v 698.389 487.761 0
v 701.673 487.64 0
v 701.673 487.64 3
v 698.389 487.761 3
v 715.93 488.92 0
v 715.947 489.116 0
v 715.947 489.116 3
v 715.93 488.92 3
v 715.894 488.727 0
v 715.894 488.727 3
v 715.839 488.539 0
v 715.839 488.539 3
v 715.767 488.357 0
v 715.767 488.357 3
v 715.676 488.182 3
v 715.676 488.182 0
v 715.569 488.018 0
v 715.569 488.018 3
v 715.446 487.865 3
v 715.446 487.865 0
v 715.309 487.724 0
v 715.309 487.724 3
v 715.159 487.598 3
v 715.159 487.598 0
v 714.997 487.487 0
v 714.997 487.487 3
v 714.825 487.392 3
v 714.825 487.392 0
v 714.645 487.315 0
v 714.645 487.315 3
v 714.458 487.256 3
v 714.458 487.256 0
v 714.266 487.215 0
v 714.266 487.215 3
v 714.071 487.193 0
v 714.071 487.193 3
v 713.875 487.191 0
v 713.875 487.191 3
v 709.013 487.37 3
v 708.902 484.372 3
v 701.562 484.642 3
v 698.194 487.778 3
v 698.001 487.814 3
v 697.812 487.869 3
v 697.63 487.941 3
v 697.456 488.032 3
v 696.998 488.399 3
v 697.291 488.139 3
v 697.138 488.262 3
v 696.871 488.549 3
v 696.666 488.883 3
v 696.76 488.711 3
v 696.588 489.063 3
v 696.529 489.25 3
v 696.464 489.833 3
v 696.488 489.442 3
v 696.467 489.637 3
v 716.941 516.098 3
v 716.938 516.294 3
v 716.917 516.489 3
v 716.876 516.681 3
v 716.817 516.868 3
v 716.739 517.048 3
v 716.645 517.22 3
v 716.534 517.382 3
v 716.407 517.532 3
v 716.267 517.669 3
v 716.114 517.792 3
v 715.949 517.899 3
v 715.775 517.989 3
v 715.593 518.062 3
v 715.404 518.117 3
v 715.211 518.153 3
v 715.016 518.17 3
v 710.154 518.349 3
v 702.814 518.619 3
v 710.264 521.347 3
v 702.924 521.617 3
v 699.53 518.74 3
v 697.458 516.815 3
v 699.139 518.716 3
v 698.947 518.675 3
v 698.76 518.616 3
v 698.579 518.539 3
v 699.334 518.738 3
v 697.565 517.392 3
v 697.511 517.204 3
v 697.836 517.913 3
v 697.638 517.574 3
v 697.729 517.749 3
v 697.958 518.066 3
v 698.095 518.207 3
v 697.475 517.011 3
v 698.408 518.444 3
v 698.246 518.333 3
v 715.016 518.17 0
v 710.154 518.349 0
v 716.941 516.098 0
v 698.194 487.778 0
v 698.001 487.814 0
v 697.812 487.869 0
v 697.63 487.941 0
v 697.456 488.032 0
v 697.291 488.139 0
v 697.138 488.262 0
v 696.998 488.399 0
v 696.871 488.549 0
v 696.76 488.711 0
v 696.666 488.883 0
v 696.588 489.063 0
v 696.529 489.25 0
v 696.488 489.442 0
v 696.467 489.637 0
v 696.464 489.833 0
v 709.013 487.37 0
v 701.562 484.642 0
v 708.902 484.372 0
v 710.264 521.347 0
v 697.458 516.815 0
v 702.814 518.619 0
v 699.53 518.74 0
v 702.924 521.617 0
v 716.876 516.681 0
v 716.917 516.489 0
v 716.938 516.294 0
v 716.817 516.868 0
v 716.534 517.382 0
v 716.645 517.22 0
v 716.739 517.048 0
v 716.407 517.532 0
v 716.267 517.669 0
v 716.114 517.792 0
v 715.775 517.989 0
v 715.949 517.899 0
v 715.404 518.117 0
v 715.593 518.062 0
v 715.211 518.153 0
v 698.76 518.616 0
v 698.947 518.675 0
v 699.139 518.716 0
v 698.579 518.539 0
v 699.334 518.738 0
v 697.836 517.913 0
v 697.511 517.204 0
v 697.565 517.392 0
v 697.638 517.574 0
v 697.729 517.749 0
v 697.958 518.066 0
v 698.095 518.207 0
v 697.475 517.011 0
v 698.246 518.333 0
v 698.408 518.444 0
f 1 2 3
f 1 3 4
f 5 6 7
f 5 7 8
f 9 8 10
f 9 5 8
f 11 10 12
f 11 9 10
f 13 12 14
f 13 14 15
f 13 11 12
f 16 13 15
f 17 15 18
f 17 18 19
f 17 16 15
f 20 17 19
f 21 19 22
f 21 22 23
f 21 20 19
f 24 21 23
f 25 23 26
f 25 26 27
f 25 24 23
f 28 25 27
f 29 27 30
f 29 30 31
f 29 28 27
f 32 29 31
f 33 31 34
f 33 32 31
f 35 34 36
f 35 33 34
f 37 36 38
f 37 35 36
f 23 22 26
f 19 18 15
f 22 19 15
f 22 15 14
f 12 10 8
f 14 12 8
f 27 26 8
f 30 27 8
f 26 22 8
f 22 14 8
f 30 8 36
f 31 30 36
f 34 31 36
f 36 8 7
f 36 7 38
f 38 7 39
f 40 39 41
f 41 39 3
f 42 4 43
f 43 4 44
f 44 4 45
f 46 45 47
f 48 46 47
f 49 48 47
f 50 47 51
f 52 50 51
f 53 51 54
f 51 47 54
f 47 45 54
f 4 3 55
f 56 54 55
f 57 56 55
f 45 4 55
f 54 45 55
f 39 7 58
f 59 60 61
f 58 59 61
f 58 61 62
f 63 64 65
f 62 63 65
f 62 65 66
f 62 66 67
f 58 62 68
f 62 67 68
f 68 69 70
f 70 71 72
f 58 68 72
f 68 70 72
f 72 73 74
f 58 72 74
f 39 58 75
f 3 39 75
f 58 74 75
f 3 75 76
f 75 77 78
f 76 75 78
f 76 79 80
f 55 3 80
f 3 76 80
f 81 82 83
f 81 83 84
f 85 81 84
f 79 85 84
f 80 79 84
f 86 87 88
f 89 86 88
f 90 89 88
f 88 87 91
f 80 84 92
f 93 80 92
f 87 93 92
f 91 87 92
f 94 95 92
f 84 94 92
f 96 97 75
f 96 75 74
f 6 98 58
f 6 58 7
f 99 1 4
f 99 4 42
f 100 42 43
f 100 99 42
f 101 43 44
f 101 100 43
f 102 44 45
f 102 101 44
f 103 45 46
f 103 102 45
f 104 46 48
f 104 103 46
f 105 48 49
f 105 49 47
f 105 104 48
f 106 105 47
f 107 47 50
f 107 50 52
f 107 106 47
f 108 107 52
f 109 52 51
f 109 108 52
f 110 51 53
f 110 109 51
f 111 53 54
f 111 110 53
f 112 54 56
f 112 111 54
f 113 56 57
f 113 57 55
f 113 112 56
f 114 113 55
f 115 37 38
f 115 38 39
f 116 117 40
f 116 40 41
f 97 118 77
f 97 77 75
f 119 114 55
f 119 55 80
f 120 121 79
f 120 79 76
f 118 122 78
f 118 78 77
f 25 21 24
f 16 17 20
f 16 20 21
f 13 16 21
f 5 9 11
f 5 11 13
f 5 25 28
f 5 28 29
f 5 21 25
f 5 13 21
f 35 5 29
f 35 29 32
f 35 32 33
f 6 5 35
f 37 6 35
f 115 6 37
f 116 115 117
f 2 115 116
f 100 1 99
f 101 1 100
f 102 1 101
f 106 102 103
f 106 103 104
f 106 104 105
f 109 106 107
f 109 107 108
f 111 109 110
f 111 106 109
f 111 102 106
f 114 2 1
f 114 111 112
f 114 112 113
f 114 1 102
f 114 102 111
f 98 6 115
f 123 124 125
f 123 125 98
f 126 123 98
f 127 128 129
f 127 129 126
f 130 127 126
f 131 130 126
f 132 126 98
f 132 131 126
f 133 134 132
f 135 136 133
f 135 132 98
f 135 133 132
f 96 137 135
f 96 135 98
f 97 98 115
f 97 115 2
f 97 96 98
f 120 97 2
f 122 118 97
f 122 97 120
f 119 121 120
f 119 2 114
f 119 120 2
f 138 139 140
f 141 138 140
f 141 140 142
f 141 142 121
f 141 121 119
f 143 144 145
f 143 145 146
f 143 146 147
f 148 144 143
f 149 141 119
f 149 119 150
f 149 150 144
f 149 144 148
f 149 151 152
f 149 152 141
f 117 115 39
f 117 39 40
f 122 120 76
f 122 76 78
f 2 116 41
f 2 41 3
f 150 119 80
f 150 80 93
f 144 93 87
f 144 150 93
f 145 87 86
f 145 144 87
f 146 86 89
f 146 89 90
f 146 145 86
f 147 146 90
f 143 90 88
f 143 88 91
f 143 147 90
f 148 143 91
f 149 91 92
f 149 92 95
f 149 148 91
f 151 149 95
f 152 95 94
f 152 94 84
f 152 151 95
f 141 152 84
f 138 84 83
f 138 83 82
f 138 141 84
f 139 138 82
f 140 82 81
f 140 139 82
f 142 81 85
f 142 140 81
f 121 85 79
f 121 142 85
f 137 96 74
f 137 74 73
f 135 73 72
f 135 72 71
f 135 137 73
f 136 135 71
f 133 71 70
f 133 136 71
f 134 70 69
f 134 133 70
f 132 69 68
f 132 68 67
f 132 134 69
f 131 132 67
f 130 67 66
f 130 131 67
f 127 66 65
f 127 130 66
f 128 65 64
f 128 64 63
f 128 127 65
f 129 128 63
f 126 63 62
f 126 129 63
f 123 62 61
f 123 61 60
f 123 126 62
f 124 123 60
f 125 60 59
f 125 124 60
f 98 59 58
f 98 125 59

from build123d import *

# Parameters (mm, degrees)
BASE_EXTRUDE_DEPTH = 3


with BuildPart() as part:
    # Sketch1 → Base-Extrude (new body)
    with BuildSketch(Plane.XY):
        with BuildLine():
            Line((701.562436995, 484.642265501), (701.672859679, 487.640232618))
            Line((701.672859679, 487.640232618), (698.38928136, 487.761175083))
            ThreePointArc((698.38928136, 487.761175083), (696.997587478, 488.398618328), (696.464251738, 489.83343495))
            Line((696.464251738, 489.83343495), (697.458055899, 516.815138997))
            ThreePointArc((697.458055899, 516.815138997), (698.095499144, 518.206832879), (699.530315766, 518.740168618))
            Line((699.530315766, 518.740168618), (702.813894085, 518.619226153))
            Line((702.813894085, 518.619226153), (702.92431677, 521.61719327))
            Line((702.92431677, 521.61719327), (710.26431677, 521.346842571))
            Line((710.26431677, 521.346842571), (710.153894085, 518.348875455))
            Line((710.153894085, 518.348875455), (715.015630112, 518.169805464))
            ThreePointArc((715.015630112, 518.169805464), (716.407323993, 517.532362219), (716.940659733, 516.097545597))
            Line((716.940659733, 516.097545597), (715.946855573, 489.11584155))
            ThreePointArc((715.946855573, 489.11584155), (715.309412328, 487.724147668), (713.874595706, 487.190811929))
            Line((713.874595706, 487.190811929), (709.012859679, 487.369881919))
            Line((709.012859679, 487.369881919), (708.902436995, 484.371914803))
            Line((708.902436995, 484.371914803), (701.562436995, 484.642265501))
        make_face()
    extrude(amount=BASE_EXTRUDE_DEPTH)


solid = part.part
